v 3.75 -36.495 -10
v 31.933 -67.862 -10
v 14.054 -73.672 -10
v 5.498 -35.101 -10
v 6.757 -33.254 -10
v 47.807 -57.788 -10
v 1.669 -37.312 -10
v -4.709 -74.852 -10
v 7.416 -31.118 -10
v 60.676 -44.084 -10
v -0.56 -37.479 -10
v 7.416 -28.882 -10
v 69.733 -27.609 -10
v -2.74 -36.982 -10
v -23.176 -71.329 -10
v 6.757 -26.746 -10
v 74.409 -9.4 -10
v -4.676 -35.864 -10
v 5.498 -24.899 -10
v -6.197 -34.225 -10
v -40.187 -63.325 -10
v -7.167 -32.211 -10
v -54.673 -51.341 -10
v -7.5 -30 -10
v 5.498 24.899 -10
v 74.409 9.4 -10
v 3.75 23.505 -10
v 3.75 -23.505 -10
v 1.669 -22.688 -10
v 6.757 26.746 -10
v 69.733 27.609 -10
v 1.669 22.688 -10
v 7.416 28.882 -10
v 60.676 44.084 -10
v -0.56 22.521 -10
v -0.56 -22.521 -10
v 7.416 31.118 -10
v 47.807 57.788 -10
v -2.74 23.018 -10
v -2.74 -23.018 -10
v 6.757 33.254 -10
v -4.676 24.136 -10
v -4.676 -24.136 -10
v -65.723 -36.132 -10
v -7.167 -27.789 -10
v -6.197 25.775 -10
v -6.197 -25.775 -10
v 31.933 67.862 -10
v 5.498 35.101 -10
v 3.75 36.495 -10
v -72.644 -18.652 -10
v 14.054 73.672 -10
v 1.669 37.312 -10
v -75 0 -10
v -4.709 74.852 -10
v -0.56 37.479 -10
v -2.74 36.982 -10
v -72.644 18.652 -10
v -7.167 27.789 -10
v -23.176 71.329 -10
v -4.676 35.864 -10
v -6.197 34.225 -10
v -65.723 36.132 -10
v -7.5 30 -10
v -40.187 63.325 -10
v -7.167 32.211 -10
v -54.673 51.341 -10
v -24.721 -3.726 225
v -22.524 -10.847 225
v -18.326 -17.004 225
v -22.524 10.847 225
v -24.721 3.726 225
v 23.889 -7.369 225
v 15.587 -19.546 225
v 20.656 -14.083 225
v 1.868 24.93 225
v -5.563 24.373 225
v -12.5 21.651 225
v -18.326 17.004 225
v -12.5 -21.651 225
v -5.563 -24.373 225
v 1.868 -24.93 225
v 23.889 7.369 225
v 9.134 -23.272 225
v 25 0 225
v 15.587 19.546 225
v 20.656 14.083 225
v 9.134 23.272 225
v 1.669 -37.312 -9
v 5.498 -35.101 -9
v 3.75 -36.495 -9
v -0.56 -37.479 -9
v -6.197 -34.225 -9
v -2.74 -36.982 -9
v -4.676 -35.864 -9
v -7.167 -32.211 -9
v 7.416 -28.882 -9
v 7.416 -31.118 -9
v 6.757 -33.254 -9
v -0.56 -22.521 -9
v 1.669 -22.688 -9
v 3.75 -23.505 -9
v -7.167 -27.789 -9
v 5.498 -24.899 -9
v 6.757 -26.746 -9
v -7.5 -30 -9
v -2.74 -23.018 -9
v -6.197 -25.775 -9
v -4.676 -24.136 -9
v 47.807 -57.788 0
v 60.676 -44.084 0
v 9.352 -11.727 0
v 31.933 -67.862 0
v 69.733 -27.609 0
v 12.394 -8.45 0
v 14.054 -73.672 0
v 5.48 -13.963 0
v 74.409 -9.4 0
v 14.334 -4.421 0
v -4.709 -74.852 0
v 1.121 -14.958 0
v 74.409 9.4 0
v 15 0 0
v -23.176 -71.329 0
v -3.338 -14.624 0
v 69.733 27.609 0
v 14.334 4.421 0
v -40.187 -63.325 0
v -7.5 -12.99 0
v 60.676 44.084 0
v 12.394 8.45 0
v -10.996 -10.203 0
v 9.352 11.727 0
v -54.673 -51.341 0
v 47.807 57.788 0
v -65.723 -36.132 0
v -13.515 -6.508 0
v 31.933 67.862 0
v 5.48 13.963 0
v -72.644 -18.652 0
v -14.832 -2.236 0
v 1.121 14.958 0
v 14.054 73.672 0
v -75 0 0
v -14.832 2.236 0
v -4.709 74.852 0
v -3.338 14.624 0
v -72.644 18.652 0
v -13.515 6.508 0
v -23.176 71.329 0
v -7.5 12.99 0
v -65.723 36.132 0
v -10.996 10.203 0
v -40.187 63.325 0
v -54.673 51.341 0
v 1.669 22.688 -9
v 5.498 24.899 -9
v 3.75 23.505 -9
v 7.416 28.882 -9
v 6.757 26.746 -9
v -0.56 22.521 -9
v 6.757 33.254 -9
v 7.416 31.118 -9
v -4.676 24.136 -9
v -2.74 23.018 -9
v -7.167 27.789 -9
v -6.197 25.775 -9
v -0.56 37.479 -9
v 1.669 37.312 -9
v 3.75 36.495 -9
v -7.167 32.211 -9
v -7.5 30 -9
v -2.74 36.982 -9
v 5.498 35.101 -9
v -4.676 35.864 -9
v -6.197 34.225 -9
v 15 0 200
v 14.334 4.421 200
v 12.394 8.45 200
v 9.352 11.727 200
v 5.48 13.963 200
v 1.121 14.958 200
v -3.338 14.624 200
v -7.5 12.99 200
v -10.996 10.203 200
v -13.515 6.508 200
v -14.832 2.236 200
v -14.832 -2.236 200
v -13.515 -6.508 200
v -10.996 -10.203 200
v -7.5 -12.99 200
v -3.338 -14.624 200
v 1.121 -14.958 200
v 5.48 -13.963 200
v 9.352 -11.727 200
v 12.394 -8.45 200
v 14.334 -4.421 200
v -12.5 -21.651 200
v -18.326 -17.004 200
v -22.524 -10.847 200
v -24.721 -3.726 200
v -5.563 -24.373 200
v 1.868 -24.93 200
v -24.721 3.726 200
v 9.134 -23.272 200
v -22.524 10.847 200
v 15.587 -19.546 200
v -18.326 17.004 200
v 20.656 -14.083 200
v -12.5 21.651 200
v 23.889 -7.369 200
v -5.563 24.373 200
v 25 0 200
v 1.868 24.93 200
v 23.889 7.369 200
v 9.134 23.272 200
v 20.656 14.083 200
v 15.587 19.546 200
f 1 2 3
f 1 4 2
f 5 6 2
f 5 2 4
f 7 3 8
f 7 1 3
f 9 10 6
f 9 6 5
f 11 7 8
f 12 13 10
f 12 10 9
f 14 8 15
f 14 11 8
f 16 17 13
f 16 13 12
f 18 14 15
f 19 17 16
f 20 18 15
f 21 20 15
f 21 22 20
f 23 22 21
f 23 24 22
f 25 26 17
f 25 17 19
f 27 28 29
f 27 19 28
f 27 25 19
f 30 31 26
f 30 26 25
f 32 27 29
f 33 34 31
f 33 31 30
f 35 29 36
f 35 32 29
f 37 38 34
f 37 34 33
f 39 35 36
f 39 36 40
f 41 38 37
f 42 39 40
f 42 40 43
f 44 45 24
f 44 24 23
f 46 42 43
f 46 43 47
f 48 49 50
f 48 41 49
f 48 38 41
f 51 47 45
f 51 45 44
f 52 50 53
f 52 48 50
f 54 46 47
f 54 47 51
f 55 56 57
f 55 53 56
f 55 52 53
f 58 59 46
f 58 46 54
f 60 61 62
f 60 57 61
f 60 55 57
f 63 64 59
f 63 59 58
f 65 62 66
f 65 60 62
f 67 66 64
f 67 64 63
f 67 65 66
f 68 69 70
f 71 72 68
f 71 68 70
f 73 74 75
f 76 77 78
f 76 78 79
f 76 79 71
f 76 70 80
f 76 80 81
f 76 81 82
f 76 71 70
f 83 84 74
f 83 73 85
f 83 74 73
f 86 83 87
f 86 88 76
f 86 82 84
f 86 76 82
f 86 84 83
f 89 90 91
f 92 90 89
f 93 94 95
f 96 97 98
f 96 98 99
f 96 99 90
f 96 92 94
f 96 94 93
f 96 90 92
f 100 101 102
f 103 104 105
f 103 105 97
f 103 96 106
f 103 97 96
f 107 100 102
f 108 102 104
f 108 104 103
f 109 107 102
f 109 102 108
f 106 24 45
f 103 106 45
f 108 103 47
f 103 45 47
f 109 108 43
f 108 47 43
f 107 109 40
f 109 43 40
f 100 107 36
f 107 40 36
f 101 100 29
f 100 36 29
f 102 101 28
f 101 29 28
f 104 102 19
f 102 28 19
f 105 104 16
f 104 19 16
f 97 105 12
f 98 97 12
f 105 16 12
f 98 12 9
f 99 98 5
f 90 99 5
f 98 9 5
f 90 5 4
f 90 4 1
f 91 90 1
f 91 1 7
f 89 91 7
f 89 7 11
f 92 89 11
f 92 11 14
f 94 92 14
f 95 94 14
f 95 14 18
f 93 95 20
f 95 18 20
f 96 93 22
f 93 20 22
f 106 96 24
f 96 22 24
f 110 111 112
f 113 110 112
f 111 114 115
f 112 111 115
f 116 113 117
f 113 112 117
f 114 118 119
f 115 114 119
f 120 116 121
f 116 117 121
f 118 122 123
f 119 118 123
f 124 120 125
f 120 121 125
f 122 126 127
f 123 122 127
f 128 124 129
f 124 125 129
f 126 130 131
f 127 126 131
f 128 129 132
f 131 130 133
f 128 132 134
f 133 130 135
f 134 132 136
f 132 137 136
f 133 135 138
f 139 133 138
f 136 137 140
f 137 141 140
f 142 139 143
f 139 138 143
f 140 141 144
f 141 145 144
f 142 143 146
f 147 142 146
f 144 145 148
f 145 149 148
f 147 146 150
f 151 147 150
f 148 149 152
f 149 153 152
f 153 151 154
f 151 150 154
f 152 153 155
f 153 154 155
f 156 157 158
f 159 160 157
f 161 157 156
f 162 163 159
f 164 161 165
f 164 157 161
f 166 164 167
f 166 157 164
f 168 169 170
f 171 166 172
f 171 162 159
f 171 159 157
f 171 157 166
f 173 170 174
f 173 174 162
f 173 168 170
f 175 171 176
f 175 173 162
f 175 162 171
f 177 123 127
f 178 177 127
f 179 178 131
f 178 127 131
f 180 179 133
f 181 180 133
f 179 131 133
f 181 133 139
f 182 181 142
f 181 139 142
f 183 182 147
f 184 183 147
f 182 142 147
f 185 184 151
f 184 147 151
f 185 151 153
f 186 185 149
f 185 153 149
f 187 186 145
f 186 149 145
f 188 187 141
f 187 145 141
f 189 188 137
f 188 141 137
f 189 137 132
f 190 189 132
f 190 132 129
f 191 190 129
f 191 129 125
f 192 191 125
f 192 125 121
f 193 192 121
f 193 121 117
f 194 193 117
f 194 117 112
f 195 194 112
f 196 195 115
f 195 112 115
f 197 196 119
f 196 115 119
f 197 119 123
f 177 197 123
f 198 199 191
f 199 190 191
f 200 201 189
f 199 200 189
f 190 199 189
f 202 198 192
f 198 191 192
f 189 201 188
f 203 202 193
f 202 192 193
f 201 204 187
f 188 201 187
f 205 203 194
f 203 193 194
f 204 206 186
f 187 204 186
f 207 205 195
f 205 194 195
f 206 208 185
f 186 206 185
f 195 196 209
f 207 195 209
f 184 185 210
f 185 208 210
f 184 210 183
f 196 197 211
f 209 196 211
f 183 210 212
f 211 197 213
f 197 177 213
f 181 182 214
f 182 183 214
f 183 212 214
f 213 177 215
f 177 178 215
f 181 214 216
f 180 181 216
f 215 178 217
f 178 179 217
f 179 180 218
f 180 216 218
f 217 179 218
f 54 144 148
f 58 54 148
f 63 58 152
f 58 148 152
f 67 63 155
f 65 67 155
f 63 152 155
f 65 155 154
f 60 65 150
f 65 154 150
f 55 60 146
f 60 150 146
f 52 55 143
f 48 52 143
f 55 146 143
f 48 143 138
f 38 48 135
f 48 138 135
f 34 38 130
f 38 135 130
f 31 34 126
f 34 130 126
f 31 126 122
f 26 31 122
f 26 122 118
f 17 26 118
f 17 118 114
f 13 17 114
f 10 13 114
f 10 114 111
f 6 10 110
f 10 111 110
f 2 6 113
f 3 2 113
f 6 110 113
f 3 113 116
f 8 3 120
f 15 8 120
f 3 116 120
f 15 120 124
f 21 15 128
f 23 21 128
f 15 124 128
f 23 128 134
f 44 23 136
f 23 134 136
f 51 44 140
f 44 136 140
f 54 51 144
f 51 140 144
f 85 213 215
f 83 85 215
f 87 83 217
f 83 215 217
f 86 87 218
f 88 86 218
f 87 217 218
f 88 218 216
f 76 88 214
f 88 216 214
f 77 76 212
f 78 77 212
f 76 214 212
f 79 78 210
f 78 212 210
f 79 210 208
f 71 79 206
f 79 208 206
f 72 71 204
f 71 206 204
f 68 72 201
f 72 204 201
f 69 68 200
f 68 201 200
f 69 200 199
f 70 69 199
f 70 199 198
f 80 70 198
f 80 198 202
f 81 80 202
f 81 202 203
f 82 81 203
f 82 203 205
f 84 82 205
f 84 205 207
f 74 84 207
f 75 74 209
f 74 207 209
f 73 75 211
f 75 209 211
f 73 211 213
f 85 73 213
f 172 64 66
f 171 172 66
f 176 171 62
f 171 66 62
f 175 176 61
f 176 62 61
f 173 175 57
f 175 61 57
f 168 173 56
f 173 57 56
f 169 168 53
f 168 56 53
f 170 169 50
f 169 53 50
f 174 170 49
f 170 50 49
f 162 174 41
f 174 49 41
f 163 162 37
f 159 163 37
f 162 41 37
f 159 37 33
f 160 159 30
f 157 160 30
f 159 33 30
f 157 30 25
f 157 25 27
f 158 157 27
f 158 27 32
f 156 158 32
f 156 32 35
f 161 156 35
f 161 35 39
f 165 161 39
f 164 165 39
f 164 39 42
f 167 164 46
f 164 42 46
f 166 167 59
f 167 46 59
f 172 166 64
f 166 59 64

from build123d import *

# Parameters (mm, degrees)
SKETCH1_R           = 15
BOSS_EXTRUDE1_DEPTH = 200
SKETCH2_R           = 25
BOSS_EXTRUDE2_DEPTH = 25
SKETCH3_R           = 75
BOSS_EXTRUDE3_DEPTH = 10
SKETCH4_R           = 7.5
CUT_EXTRUDE1_DEPTH  = 1


with BuildPart() as part:
    # Sketch1 → Boss-Extrude1 (new body)
    with BuildSketch(Plane.XY):
        Circle(SKETCH1_R)
    extrude(amount=BOSS_EXTRUDE1_DEPTH)

    # Sketch2 → Boss-Extrude2 (add)
    with BuildSketch(Plane.XY.offset(200)):
        Circle(SKETCH2_R)
    extrude(amount=BOSS_EXTRUDE2_DEPTH)

    # Sketch3 → Boss-Extrude3 (add)
    with BuildSketch(Plane(origin=(0, 0, 0), x_dir=(-1, 0, 0), z_dir=(0, 0, -1))):
        Circle(SKETCH3_R)
    extrude(amount=BOSS_EXTRUDE3_DEPTH)

    # Sketch4 → Cut-Extrude1 (cut)
    with BuildSketch(Plane(origin=(0, 0, -10), x_dir=(-1, 0, 0), z_dir=(0, 0, -1))):
        with Locations((0, 30)):
            Circle(SKETCH4_R)
        with Locations((0, -30)):
            Circle(SKETCH4_R)
    extrude(amount=-CUT_EXTRUDE1_DEPTH, mode=Mode.SUBTRACT)


solid = part.part
